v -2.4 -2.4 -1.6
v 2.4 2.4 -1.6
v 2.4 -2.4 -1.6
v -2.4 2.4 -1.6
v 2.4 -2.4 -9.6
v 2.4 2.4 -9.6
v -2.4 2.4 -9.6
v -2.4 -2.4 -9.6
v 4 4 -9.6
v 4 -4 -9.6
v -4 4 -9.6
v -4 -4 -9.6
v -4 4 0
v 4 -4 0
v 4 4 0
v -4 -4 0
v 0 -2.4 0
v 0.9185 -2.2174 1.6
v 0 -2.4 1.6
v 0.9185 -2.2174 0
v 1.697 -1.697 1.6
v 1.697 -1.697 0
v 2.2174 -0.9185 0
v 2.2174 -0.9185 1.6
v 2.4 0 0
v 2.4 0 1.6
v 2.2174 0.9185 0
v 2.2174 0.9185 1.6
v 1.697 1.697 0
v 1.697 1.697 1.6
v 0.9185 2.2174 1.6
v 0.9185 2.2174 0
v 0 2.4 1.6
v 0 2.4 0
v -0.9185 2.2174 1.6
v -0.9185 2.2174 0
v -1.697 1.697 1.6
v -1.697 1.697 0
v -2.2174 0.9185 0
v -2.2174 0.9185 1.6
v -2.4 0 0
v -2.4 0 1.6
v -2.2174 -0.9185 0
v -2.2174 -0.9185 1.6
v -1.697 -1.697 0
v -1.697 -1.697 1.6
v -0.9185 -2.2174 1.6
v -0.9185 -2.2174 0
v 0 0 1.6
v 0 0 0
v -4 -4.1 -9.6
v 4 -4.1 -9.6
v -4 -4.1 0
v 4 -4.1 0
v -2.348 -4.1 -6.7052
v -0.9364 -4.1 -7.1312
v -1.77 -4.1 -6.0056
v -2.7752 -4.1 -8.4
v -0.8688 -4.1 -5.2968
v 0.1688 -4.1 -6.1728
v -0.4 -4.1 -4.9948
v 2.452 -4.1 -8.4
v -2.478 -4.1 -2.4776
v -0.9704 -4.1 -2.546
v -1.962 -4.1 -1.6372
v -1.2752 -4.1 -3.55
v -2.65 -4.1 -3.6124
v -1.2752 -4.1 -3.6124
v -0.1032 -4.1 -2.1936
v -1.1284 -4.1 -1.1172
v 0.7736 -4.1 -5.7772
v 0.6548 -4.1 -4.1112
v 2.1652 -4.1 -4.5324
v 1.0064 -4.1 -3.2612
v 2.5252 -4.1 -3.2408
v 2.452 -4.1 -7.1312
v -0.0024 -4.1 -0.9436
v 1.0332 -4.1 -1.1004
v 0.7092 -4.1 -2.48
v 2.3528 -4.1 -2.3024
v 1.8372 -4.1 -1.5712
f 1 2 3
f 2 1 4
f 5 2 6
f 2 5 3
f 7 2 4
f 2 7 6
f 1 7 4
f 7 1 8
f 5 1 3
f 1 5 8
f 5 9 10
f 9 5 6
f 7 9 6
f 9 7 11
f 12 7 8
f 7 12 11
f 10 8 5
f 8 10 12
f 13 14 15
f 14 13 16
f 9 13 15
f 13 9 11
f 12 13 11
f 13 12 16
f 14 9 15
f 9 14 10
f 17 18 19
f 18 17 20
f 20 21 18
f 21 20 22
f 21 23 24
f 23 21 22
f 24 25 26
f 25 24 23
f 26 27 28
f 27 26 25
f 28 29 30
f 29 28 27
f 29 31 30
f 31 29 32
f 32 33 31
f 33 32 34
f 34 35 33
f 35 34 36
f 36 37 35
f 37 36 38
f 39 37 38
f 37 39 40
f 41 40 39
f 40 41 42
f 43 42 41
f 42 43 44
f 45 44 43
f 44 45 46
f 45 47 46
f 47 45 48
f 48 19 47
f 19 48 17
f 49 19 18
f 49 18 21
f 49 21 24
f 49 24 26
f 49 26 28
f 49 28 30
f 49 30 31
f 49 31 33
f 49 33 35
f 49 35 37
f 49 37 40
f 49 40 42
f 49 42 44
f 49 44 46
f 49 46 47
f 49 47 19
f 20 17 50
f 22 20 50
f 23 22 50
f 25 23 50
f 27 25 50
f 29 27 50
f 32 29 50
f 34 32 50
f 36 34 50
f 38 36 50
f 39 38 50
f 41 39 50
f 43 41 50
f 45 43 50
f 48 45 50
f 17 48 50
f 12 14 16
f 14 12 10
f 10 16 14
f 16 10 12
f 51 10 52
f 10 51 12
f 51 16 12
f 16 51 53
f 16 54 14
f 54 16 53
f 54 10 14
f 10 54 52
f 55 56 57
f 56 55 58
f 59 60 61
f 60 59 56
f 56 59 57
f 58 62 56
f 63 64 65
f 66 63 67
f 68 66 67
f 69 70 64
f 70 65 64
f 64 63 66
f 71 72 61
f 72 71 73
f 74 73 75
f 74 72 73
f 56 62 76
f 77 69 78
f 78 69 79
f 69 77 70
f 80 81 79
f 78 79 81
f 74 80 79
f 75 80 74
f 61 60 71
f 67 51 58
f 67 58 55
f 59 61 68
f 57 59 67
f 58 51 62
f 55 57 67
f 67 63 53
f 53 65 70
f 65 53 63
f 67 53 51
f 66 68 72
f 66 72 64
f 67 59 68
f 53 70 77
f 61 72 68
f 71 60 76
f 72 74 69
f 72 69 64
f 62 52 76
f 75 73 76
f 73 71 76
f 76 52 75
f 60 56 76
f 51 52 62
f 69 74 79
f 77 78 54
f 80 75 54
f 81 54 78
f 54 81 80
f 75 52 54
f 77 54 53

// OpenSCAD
// file: ../p/4-4edge.scad
use <../lib.scad>
function ldraw_lib__4_4edge() = [
// 0 Circle 1.0
// 0 Name: 4-4edge.dat
// 0 Author: James Jessiman
// 0 !LDRAW_ORG Primitive UPDATE 2017-01
// 0 !LICENSE Licensed under CC BY 2.0 and CC BY 4.0 : see CAreadme.txt
// 
// 0 BFC CERTIFY CCW
  [0,"BFC","CERTIFY"],
  [0,"BFC","CCW"],
// 
// 0 !HISTORY 1998-12-15 [PTadmin] Official Update 1998-10
// 0 !HISTORY 2005-12-28 [PTadmin] Official Update 2005-01
// 0 !HISTORY 2007-06-24 [PTadmin] Header formatted for Contributor Agreement
// 0 !HISTORY 2008-07-01 [PTadmin] Official Update 2008-01
// 0 !HISTORY 2017-01-15 [Steffen] BFCed
// 0 !HISTORY 2017-12-30 [PTadmin] Official Update 2017-01
// 
// 
// 2 24 1 0 0 0.9239 0 0.3827
  [2,24,1,0,0,0.9239,0,0.3827],
// 2 24 0.9239 0 0.3827 0.7071 0 0.7071
  [2,24,0.9239,0,0.3827,0.7071,0,0.7071],
// 2 24 0.7071 0 0.7071 0.3827 0 0.9239
  [2,24,0.7071,0,0.7071,0.3827,0,0.9239],
// 2 24 0.3827 0 0.9239 0 0 1
  [2,24,0.3827,0,0.9239,0,0,1],
// 2 24 0 0 1 -0.3827 0 0.9239
  [2,24,0,0,1,-0.3827,0,0.9239],
// 2 24 -0.3827 0 0.9239 -0.7071 0 0.7071
  [2,24,-0.3827,0,0.9239,-0.7071,0,0.7071],
// 2 24 -0.7071 0 0.7071 -0.9239 0 0.3827
  [2,24,-0.7071,0,0.7071,-0.9239,0,0.3827],
// 2 24 -0.9239 0 0.3827 -1 0 -0
  [2,24,-0.9239,0,0.3827,-1,0,-0],
// 2 24 -1 0 -0 -0.9239 0 -0.3827
  [2,24,-1,0,-0,-0.9239,0,-0.3827],
// 2 24 -0.9239 0 -0.3827 -0.7071 0 -0.7071
  [2,24,-0.9239,0,-0.3827,-0.7071,0,-0.7071],
// 2 24 -0.7071 0 -0.7071 -0.3827 0 -0.9239
  [2,24,-0.7071,0,-0.7071,-0.3827,0,-0.9239],
// 2 24 -0.3827 0 -0.9239 0 0 -1
  [2,24,-0.3827,0,-0.9239,0,0,-1],
// 2 24 0 0 -1 0.3827 0 -0.9239
  [2,24,0,0,-1,0.3827,0,-0.9239],
// 2 24 0.3827 0 -0.9239 0.7071 0 -0.7071
  [2,24,0.3827,0,-0.9239,0.7071,0,-0.7071],
// 2 24 0.7071 0 -0.7071 0.9239 0 -0.3827
  [2,24,0.7071,0,-0.7071,0.9239,0,-0.3827],
// 2 24 0.9239 0 -0.3827 1 0 0
  [2,24,0.9239,0,-0.3827,1,0,0],
];
module ldraw_lib__4_4edge(step=0, col=false, unit=2/5, alt=false, line=0.2, solid=!$preview)
    makepoly(ldraw_lib__4_4edge(), step=step, col=col, unit=unit, alt=alt, line=line, solid=solid);
ldraw_lib__4_4edge(line=0.2);
// file: ../p/4-4disc.scad
use <../lib.scad>
function ldraw_lib__4_4disc() = [
// 0 Disc 1.0
// 0 Name: 4-4disc.dat
// 0 Author: James Jessiman
// 0 !LDRAW_ORG Primitive UPDATE 2002-02
// 0 !LICENSE Licensed under CC BY 2.0 and CC BY 4.0 : see CAreadme.txt
// 
// 0 BFC CERTIFY CCW
  [0,"BFC","CERTIFY"],
  [0,"BFC","CCW"],
// 
// 0 !HISTORY 1998-12-15 [PTadmin] Official Update 1998-10
// 0 !HISTORY 2002-03-23 [sbliss] Added BFC statement
// 0 !HISTORY 2002-04-25 [PTadmin] Official Update 2002-02
// 0 !HISTORY 2007-06-24 [PTadmin] Header formatted for Contributor Agreement
// 0 !HISTORY 2008-07-01 [PTadmin] Official Update 2008-01
// 
// 
// 3 16 0 0 0 1 0 0 0.9239 0 0.3827
  [3,16,0,0,0,1,0,0,0.9239,0,0.3827],
// 3 16 0 0 0 0.9239 0 0.3827 0.7071 0 0.7071
  [3,16,0,0,0,0.9239,0,0.3827,0.7071,0,0.7071],
// 3 16 0 0 0 0.7071 0 0.7071 0.3827 0 0.9239
  [3,16,0,0,0,0.7071,0,0.7071,0.3827,0,0.9239],
// 3 16 0 0 0 0.3827 0 0.9239 0 0 1
  [3,16,0,0,0,0.3827,0,0.9239,0,0,1],
// 3 16 0 0 0 0 0 1 -0.3827 0 0.9239
  [3,16,0,0,0,0,0,1,-0.3827,0,0.9239],
// 3 16 0 0 0 -0.3827 0 0.9239 -0.7071 0 0.7071
  [3,16,0,0,0,-0.3827,0,0.9239,-0.7071,0,0.7071],
// 3 16 0 0 0 -0.7071 0 0.7071 -0.9239 0 0.3827
  [3,16,0,0,0,-0.7071,0,0.7071,-0.9239,0,0.3827],
// 3 16 0 0 0 -0.9239 0 0.3827 -1 0 -0
  [3,16,0,0,0,-0.9239,0,0.3827,-1,0,-0],
// 3 16 0 0 0 -1 0 -0 -0.9239 0 -0.3827
  [3,16,0,0,0,-1,0,-0,-0.9239,0,-0.3827],
// 3 16 0 0 0 -0.9239 0 -0.3827 -0.7071 0 -0.7071
  [3,16,0,0,0,-0.9239,0,-0.3827,-0.7071,0,-0.7071],
// 3 16 0 0 0 -0.7071 0 -0.7071 -0.3827 0 -0.9239
  [3,16,0,0,0,-0.7071,0,-0.7071,-0.3827,0,-0.9239],
// 3 16 0 0 0 -0.3827 0 -0.9239 0 0 -1
  [3,16,0,0,0,-0.3827,0,-0.9239,0,0,-1],
// 3 16 0 0 0 0 0 -1 0.3827 0 -0.9239
  [3,16,0,0,0,0,0,-1,0.3827,0,-0.9239],
// 3 16 0 0 0 0.3827 0 -0.9239 0.7071 0 -0.7071
  [3,16,0,0,0,0.3827,0,-0.9239,0.7071,0,-0.7071],
// 3 16 0 0 0 0.7071 0 -0.7071 0.9239 0 -0.3827
  [3,16,0,0,0,0.7071,0,-0.7071,0.9239,0,-0.3827],
// 3 16 0 0 0 0.9239 0 -0.3827 1 0 0
  [3,16,0,0,0,0.9239,0,-0.3827,1,0,0],
// 0
];
module ldraw_lib__4_4disc(step=0, col=false, unit=2/5, alt=false, line=0.2, solid=!$preview)
    makepoly(ldraw_lib__4_4disc(), step=step, col=col, unit=unit, alt=alt, line=line, solid=solid);
ldraw_lib__4_4disc(line=0.2);
// file: ../p/4-4cyli.scad
use <../lib.scad>
$fa=1; $fs=0.2;
function ldraw_lib__4_4cyli(realsolid=false) = [
// 0 Cylinder 1.0
// 0 Name: 4-4cyli.dat
// 0 Author: James Jessiman
// 0 !LDRAW_ORG Primitive UPDATE 2005-01
// 0 !LICENSE Licensed under CC BY 2.0 and CC BY 4.0 : see CAreadme.txt
// 
// 0 BFC CERTIFY CCW
  [0,"BFC","CERTIFY"],
  [0,"BFC","CCW"],
// 
// 0 !HISTORY 1998-12-15 [PTadmin] Official Update 1998-10
// 0 !HISTORY 2002-03-23 [sbliss] Added BFC statement; merged headers from files in distributions LDraw 0.27 and Complete.
// 0 !HISTORY 2002-04-25 [PTadmin] Official Update 2002-02
// 0 !HISTORY 2004-12-14 [guyvivan] BFC CCW
// 0 !HISTORY 2005-12-28 [PTadmin] Official Update 2005-01
// 0 !HISTORY 2007-06-24 [PTadmin] Header formatted for Contributor Agreement
// 0 !HISTORY 2008-07-01 [PTadmin] Official Update 2008-01
// 
// 
// 4 16 1 1 0 0.9239 1 0.3827 0.9239 0 0.3827 1 0 0
  [4,16,1,1,0,0.9239,1,0.3827,0.9239,0,0.3827,1,0,0],
// 5 24 1 0 0 1 1 0 0.9239 0 0.3827 0.9239 0 -0.3827
  [5,24,1,0,0,1,1,0,0.9239,0,0.3827,0.9239,0,-0.3827],
// 4 16 0.9239 1 0.3827 0.7071 1 0.7071 0.7071 0 0.7071 0.9239 0 0.3827
  [4,16,0.9239,1,0.3827,0.7071,1,0.7071,0.7071,0,0.7071,0.9239,0,0.3827],
// 5 24 0.9239 0 0.3827 0.9239 1 0.3827 0.7071 0 0.7071 1 0 0
  [5,24,0.9239,0,0.3827,0.9239,1,0.3827,0.7071,0,0.7071,1,0,0],
// 4 16 0.7071 1 0.7071 0.3827 1 0.9239 0.3827 0 0.9239 0.7071 0 0.7071
  [4,16,0.7071,1,0.7071,0.3827,1,0.9239,0.3827,0,0.9239,0.7071,0,0.7071],
// 5 24 0.7071 0 0.7071 0.7071 1 0.7071 0.3827 0 0.9239 0.9239 0 0.3827
  [5,24,0.7071,0,0.7071,0.7071,1,0.7071,0.3827,0,0.9239,0.9239,0,0.3827],
// 4 16 0.3827 1 0.9239 0 1 1 0 0 1 0.3827 0 0.9239
  [4,16,0.3827,1,0.9239,0,1,1,0,0,1,0.3827,0,0.9239],
// 5 24 0.3827 0 0.9239 0.3827 1 0.9239 0 0 1 0.7071 0 0.7071
  [5,24,0.3827,0,0.9239,0.3827,1,0.9239,0,0,1,0.7071,0,0.7071],
// 4 16 0 1 1 -0.3827 1 0.9239 -0.3827 0 0.9239 0 0 1
  [4,16,0,1,1,-0.3827,1,0.9239,-0.3827,0,0.9239,0,0,1],
// 5 24 0 0 1 0 1 1 -0.3827 0 0.9239 0.3827 0 0.9239
  [5,24,0,0,1,0,1,1,-0.3827,0,0.9239,0.3827,0,0.9239],
// 4 16 -0.3827 1 0.9239 -0.7071 1 0.7071 -0.7071 0 0.7071 -0.3827 0 0.9239
  [4,16,-0.3827,1,0.9239,-0.7071,1,0.7071,-0.7071,0,0.7071,-0.3827,0,0.9239],
// 5 24 -0.3827 0 0.9239 -0.3827 1 0.9239 -0.7071 0 0.7071 0 0 1
  [5,24,-0.3827,0,0.9239,-0.3827,1,0.9239,-0.7071,0,0.7071,0,0,1],
// 4 16 -0.7071 1 0.7071 -0.9239 1 0.3827 -0.9239 0 0.3827 -0.7071 0 0.7071
  [4,16,-0.7071,1,0.7071,-0.9239,1,0.3827,-0.9239,0,0.3827,-0.7071,0,0.7071],
// 5 24 -0.7071 0 0.7071 -0.7071 1 0.7071 -0.9239 0 0.3827 -0.3827 0 0.9239
  [5,24,-0.7071,0,0.7071,-0.7071,1,0.7071,-0.9239,0,0.3827,-0.3827,0,0.9239],
// 4 16 -0.9239 1 0.3827 -1 1 0 -1 0 0 -0.9239 0 0.3827
  [4,16,-0.9239,1,0.3827,-1,1,0,-1,0,0,-0.9239,0,0.3827],
// 5 24 -0.9239 0 0.3827 -0.9239 1 0.3827 -1 0 0 -0.7071 0 0.7071
  [5,24,-0.9239,0,0.3827,-0.9239,1,0.3827,-1,0,0,-0.7071,0,0.7071],
// 4 16 -1 1 0 -0.9239 1 -0.3827 -0.9239 0 -0.3827 -1 0 0
  [4,16,-1,1,0,-0.9239,1,-0.3827,-0.9239,0,-0.3827,-1,0,0],
// 5 24 -1 0 0 -1 1 0 -0.9239 0 -0.3827 -0.9239 0 0.3827
  [5,24,-1,0,0,-1,1,0,-0.9239,0,-0.3827,-0.9239,0,0.3827],
// 4 16 -0.9239 1 -0.3827 -0.7071 1 -0.7071 -0.7071 0 -0.7071 -0.9239 0 -0.3827
  [4,16,-0.9239,1,-0.3827,-0.7071,1,-0.7071,-0.7071,0,-0.7071,-0.9239,0,-0.3827],
// 5 24 -0.9239 0 -0.3827 -0.9239 1 -0.3827 -0.7071 0 -0.7071 -1 0 0
  [5,24,-0.9239,0,-0.3827,-0.9239,1,-0.3827,-0.7071,0,-0.7071,-1,0,0],
// 4 16 -0.7071 1 -0.7071 -0.3827 1 -0.9239 -0.3827 0 -0.9239 -0.7071 0 -0.7071
  [4,16,-0.7071,1,-0.7071,-0.3827,1,-0.9239,-0.3827,0,-0.9239,-0.7071,0,-0.7071],
// 5 24 -0.7071 0 -0.7071 -0.7071 1 -0.7071 -0.3827 0 -0.9239 -0.9239 0 -0.3827
  [5,24,-0.7071,0,-0.7071,-0.7071,1,-0.7071,-0.3827,0,-0.9239,-0.9239,0,-0.3827],
// 4 16 -0.3827 1 -0.9239 0 1 -1 0 0 -1 -0.3827 0 -0.9239
  [4,16,-0.3827,1,-0.9239,0,1,-1,0,0,-1,-0.3827,0,-0.9239],
// 5 24 -0.3827 0 -0.9239 -0.3827 1 -0.9239 0 0 -1 -0.7071 0 -0.7071
  [5,24,-0.3827,0,-0.9239,-0.3827,1,-0.9239,0,0,-1,-0.7071,0,-0.7071],
// 4 16 0 1 -1 0.3827 1 -0.9239 0.3827 0 -0.9239 0 0 -1
  [4,16,0,1,-1,0.3827,1,-0.9239,0.3827,0,-0.9239,0,0,-1],
// 5 24 0 0 -1 0 1 -1 0.3827 0 -0.9239 -0.3827 0 -0.9239
  [5,24,0,0,-1,0,1,-1,0.3827,0,-0.9239,-0.3827,0,-0.9239],
// 4 16 0.3827 1 -0.9239 0.7071 1 -0.7071 0.7071 0 -0.7071 0.3827 0 -0.9239
  [4,16,0.3827,1,-0.9239,0.7071,1,-0.7071,0.7071,0,-0.7071,0.3827,0,-0.9239],
// 5 24 0.3827 0 -0.9239 0.3827 1 -0.9239 0.7071 0 -0.7071 0 0 -1
  [5,24,0.3827,0,-0.9239,0.3827,1,-0.9239,0.7071,0,-0.7071,0,0,-1],
// 4 16 0.7071 1 -0.7071 0.9239 1 -0.3827 0.9239 0 -0.3827 0.7071 0 -0.7071
  [4,16,0.7071,1,-0.7071,0.9239,1,-0.3827,0.9239,0,-0.3827,0.7071,0,-0.7071],
// 5 24 0.7071 0 -0.7071 0.7071 1 -0.7071 0.9239 0 -0.3827 0.3827 0 -0.9239
  [5,24,0.7071,0,-0.7071,0.7071,1,-0.7071,0.9239,0,-0.3827,0.3827,0,-0.9239],
// 4 16 0.9239 1 -0.3827 1 1 0 1 0 0 0.9239 0 -0.3827
  [4,16,0.9239,1,-0.3827,1,1,0,1,0,0,0.9239,0,-0.3827],
// 5 24 0.9239 0 -0.3827 0.9239 1 -0.3827 1 0 0 0.7071 0 -0.7071
  [5,24,0.9239,0,-0.3827,0.9239,1,-0.3827,1,0,0,0.7071,0,-0.7071],
// 0
];
module ldraw_lib__4_4cyli(step=0, col=false, unit=2/5, alt=false, line=0.2, solid=!$preview)
    makepoly(ldraw_lib__4_4cyli(solid), step=step, col=col, unit=unit, alt=alt, line=line, solid=solid);
ldraw_lib__4_4cyli(line=0.2);
// file: ../p/stud.scad
use <../lib.scad>
use <4-4cyli.scad>
use <4-4disc.scad>
use <4-4edge.scad>
function ldraw_lib__stud() = [
// 0 Stud
// 0 Name: stud.dat
// 0 Author: James Jessiman
// 0 !LDRAW_ORG Primitive UPDATE 2012-01
// 0 !LICENSE Licensed under CC BY 4.0 : see CAreadme.txt
// 
// 0 BFC CERTIFY CCW
  [0,"BFC","CERTIFY"],
  [0,"BFC","CCW"],
// 
// 0 !HISTORY 2002-04-04 [sbliss] Modified for BFC compliance
// 0 !HISTORY 2002-04-25 [PTadmin] Official Update 2002-02
// 0 !HISTORY 2007-06-24 [PTadmin] Header formatted for Contributor Agreement
// 0 !HISTORY 2008-07-01 [PTadmin] Official Update 2008-01
// 0 !HISTORY 2012-02-16 [Philo] Changed to CCW
// 0 !HISTORY 2012-03-30 [PTadmin] Official Update 2012-01
// 
// 
// 1 16 0 0 0 6 0 0 0 1 0 0 0 6 4-4edge.dat
  [1,16,0,0,0,6,0,0,0,1,0,0,0,6, ldraw_lib__4_4edge()],
// 1 16 0 -4 0 6 0 0 0 1 0 0 0 6 4-4edge.dat
  [1,16,0,-4,0,6,0,0,0,1,0,0,0,6, ldraw_lib__4_4edge()],
// 1 16 0 0 0 6 0 0 0 -4 0 0 0 6 4-4cyli.dat
  [1,16,0,0,0,6,0,0,0,-4,0,0,0,6, ldraw_lib__4_4cyli()],
// 1 16 0 -4 0 6 0 0 0 1 0 0 0 6 4-4disc.dat
  [1,16,0,-4,0,6,0,0,0,1,0,0,0,6, ldraw_lib__4_4disc()],
  [-1,16,0,0,0,6,0,0,0,-1,0,0,0,6, ldraw_lib__4_4disc()],
];
module ldraw_lib__stud(step=0, col=false, unit=2/5, alt=false, line=0.2, solid=!$preview)
    makepoly(ldraw_lib__stud(), step=step, col=col, unit=unit, alt=alt, line=line, solid=solid);
ldraw_lib__stud(line=0.2);
// file: ../p/box5.scad
use <../lib.scad>
function ldraw_lib__box5() = [
// 0 Box with 5 Faces and All Edges
// 0 Name: box5.dat
// 0 Author: James Jessiman
// 0 !LDRAW_ORG Primitive UPDATE 2012-01
// 0 !LICENSE Licensed under CC BY 2.0 and CC BY 4.0 : see CAreadme.txt
// 
// 0 BFC CERTIFY CCW
  [0,"BFC","CERTIFY"],
  [0,"BFC","CCW"],
// 
// 0 !HISTORY 2002-04-03 [sbliss] Modified for BFC compliance
// 0 !HISTORY 2002-04-25 [PTadmin] Official Update 2002-02
// 0 !HISTORY 2007-06-24 [PTadmin] Header formatted for Contributor Agreement
// 0 !HISTORY 2008-07-01 [PTadmin] Official Update 2008-01
// 0 !HISTORY 2012-02-16 [Philo] Changed to CCW
// 0 !HISTORY 2012-03-30 [PTadmin] Official Update 2012-01
// 
// 
// 2 24 1 1 1 -1 1 1
  [2,24,1,1,1,-1,1,1],
// 2 24 -1 1 1 -1 1 -1
  [2,24,-1,1,1,-1,1,-1],
// 2 24 -1 1 -1 1 1 -1
  [2,24,-1,1,-1,1,1,-1],
// 2 24 1 1 -1 1 1 1
  [2,24,1,1,-1,1,1,1],
// 2 24 1 0 1 -1 0 1
  [2,24,1,0,1,-1,0,1],
// 2 24 -1 0 1 -1 0 -1
  [2,24,-1,0,1,-1,0,-1],
// 2 24 -1 0 -1 1 0 -1
  [2,24,-1,0,-1,1,0,-1],
// 2 24 1 0 -1 1 0 1
  [2,24,1,0,-1,1,0,1],
// 2 24 1 0 1 1 1 1
  [2,24,1,0,1,1,1,1],
// 2 24 -1 0 1 -1 1 1
  [2,24,-1,0,1,-1,1,1],
// 2 24 1 0 -1 1 1 -1
  [2,24,1,0,-1,1,1,-1],
// 2 24 -1 0 -1 -1 1 -1
  [2,24,-1,0,-1,-1,1,-1],
// 4 16 -1 1 1 1 1 1 1 1 -1 -1 1 -1
  [4,16,-1,1,1,1,1,1,1,1,-1,-1,1,-1],
// 4 16 -1 1 1 -1 0 1 1 0 1 1 1 1
  [4,16,-1,1,1,-1,0,1,1,0,1,1,1,1],
// 4 16 -1 1 -1 -1 0 -1 -1 0 1 -1 1 1
  [4,16,-1,1,-1,-1,0,-1,-1,0,1,-1,1,1],
// 4 16 1 1 -1 1 0 -1 -1 0 -1 -1 1 -1
  [4,16,1,1,-1,1,0,-1,-1,0,-1,-1,1,-1],
// 4 16 1 1 1 1 0 1 1 0 -1 1 1 -1
  [4,16,1,1,1,1,0,1,1,0,-1,1,1,-1],
];
makepoly(ldraw_lib__box5(), line=0.2);
// file: ../p/box4t.scad
use <../lib.scad>
function ldraw_lib__box4t() = [
// 0 Box with 4 Adjacent Faces and All Edges
// 0 Name: box4t.dat
// 0 Author: Tore Eriksson [Tore_Eriksson]
// 0 !LDRAW_ORG Primitive UPDATE 2003-02
// 0 !LICENSE Licensed under CC BY 2.0 and CC BY 4.0 : see CAreadme.txt
// 
// 0 BFC CERTIFY CCW
  [0,"BFC","CERTIFY"],
  [0,"BFC","CCW"],
// 
// 0 !HISTORY 1997-09-29 [PTadmin] Official Update 1997-15
// 0 !HISTORY 2002-08-31 [izanette] Modified with WINDZ for BFC compliance
// 0 !HISTORY 2003-08-01 [PTadmin] Official Update 2003-02
// 0 !HISTORY 2007-06-24 [PTadmin] Header formatted for Contributor Agreement
// 0 !HISTORY 2008-07-01 [PTadmin] Official Update 2008-01
// 
// 
// 2 24 1 1 1 -1 1 1
  [2,24,1,1,1,-1,1,1],
// 2 24 -1 1 1 -1 1 -1
  [2,24,-1,1,1,-1,1,-1],
// 2 24 -1 1 -1 1 1 -1
  [2,24,-1,1,-1,1,1,-1],
// 2 24 1 1 -1 1 1 1
  [2,24,1,1,-1,1,1,1],
// 2 24 1 0 1 -1 0 1
  [2,24,1,0,1,-1,0,1],
// 2 24 -1 0 1 -1 0 -1
  [2,24,-1,0,1,-1,0,-1],
// 2 24 -1 0 -1 1 0 -1
  [2,24,-1,0,-1,1,0,-1],
// 2 24 1 0 -1 1 0 1
  [2,24,1,0,-1,1,0,1],
// 2 24 1 0 1 1 1 1
  [2,24,1,0,1,1,1,1],
// 2 24 -1 0 1 -1 1 1
  [2,24,-1,0,1,-1,1,1],
// 2 24 1 0 -1 1 1 -1
  [2,24,1,0,-1,1,1,-1],
// 2 24 -1 0 -1 -1 1 -1
  [2,24,-1,0,-1,-1,1,-1],
// 4 16 1 1 1 1 1 -1 -1 1 -1 -1 1 1
  [4,16,1,1,1,1,1,-1,-1,1,-1,-1,1,1],
// 4 16 1 1 1 -1 1 1 -1 0 1 1 0 1
  [4,16,1,1,1,-1,1,1,-1,0,1,1,0,1],
// 4 16 -1 1 1 -1 1 -1 -1 0 -1 -1 0 1
  [4,16,-1,1,1,-1,1,-1,-1,0,-1,-1,0,1],
// 0 4 16 -1 1 -1 -1 0 -1 1 0 -1 1 1 -1
// 4 16 1 1 -1 1 1 1 1 0 1 1 0 -1
  [4,16,1,1,-1,1,1,1,1,0,1,1,0,-1],
// 0
];
makepoly(ldraw_lib__box4t(), line=0.2);
// file: s/3005s01.scad
use <../../lib.scad>
use <../../p/box4t.scad>
use <../../p/box5.scad>
use <../../p/stud.scad>
function ldraw_lib__s__3005s01() = [
// 0 ~Brick  1 x  1 without Front Face
// 0 Name: s\3005s01.dat
// 0 Author: John Riley [jriley]
// 0 !LDRAW_ORG Subpart UPDATE 2004-01
// 0 !LICENSE Licensed under CC BY 2.0 and CC BY 4.0 : see CAreadme.txt
// 
// 0 BFC CERTIFY CCW
  [0,"BFC","CERTIFY"],
  [0,"BFC","CCW"],
// 
// 0 !HISTORY 2003-09-07 [jriley] BFCed & Subfiled
// 0 !HISTORY 2004-03-02 [PTadmin] Official Update 2004-01
// 0 !HISTORY 2007-08-29 [PTadmin] Header formatted for Contributor Agreement
// 0 !HISTORY 2008-07-01 [PTadmin] Official Update 2008-01
// 
// 
// 0 BFC INVERTNEXT
  [0,"BFC","INVERTNEXT"],
// 1 16 0 24 0 0 0 6 0 -20 0 -6 0 0 box5.dat
  [1,16,0,24,0,0,0,6,0,-20,0,-6,0,0, ldraw_lib__box5()],
// 4 16 10 24 -10 6 24 -6 6 24 6 10 24 10
  [4,16,10,24,-10,6,24,-6,6,24,6,10,24,10],
// 4 16 10 24 10 6 24 6 -6 24 6 -10 24 10
  [4,16,10,24,10,6,24,6,-6,24,6,-10,24,10],
// 4 16 -10 24 10 -6 24 6 -6 24 -6 -10 24 -10
  [4,16,-10,24,10,-6,24,6,-6,24,-6,-10,24,-10],
// 4 16 -10 24 -10 -6 24 -6 6 24 -6 10 24 -10
  [4,16,-10,24,-10,-6,24,-6,6,24,-6,10,24,-10],
// 1 16 0 24 0 10 0 0 0 -24 0 0 0 10 box4t.dat
  [1,16,0,24,0,10,0,0,0,-24,0,0,0,10, ldraw_lib__box4t()],
// 1 16 0 0 0 0 0 1 0 1 0 -1 0 0 stud.dat
  [1,16,0,0,0,0,0,1,0,1,0,-1,0,0, ldraw_lib__stud()],
// 0
];
module ldraw_lib__s__3005s01(step=0, col=false, unit=2/5, alt=false, line=0.2, solid=!$preview)
    makepoly(ldraw_lib__s__3005s01(), step=step, col=col, unit=unit, alt=alt, line=line, solid=solid);
ldraw_lib__s__3005s01(line=0.2);
// file: ../p/box5-12.scad
use <../lib.scad>
function ldraw_lib__box5_12() = [
// 0 Box with 5 Faces without Any Edges
// 0 Name: box5-12.dat
// 0 Author: Chris Dee [cwdee]
// 0 !LDRAW_ORG Primitive UPDATE 2009-02
// 0 !LICENSE Licensed under CC BY 2.0 and CC BY 4.0 : see CAreadme.txt
// 
// 0 BFC CERTIFY CCW
  [0,"BFC","CERTIFY"],
  [0,"BFC","CCW"],
// 
// 0 !HISTORY 2009-09-03 [PTadmin] Official Update 2009-02
// 
// 
// 4 16 1 1 1 1 1 -1 -1 1 -1 -1 1 1
  [4,16,1,1,1,1,1,-1,-1,1,-1,-1,1,1],
// 4 16 -1 0 1 1 0 1 1 1 1 -1 1 1
  [4,16,-1,0,1,1,0,1,1,1,1,-1,1,1],
// 4 16 -1 0 -1 -1 0 1 -1 1 1 -1 1 -1
  [4,16,-1,0,-1,-1,0,1,-1,1,1,-1,1,-1],
// 4 16 1 0 -1 -1 0 -1 -1 1 -1 1 1 -1
  [4,16,1,0,-1,-1,0,-1,-1,1,-1,1,1,-1],
// 4 16 1 0 1 1 0 -1 1 1 -1 1 1 1
  [4,16,1,0,1,1,0,-1,1,1,-1,1,1,1],
// 0
];
module ldraw_lib__box5_12(step=0, col=false, unit=2/5, alt=false, line=0.2, solid=!$preview)
    makepoly(ldraw_lib__box5_12(), step=step, col=col, unit=unit, alt=alt, line=line, solid=solid);
ldraw_lib__box5_12(line=0.2);
// file: 3005.scad
use <../lib.scad>
use <s/3005s01.scad>
function ldraw_lib__3005() = [
// 0 Brick  1 x  1
// 0 Name: 3005.dat
// 0 Author: James Jessiman
// 0 !LDRAW_ORG Part UPDATE 2022-05
// 0 !LICENSE Licensed under CC BY 2.0 and CC BY 4.0 : see CAreadme.txt
// 
// 0 BFC CERTIFY CCW
  [0,"BFC","CERTIFY"],
  [0,"BFC","CCW"],
// 
// 0 !HISTORY 2001-10-26 [PTadmin] Official Update 2001-01
// 0 !HISTORY 2002-05-07 {unknown} BFC Certification
// 0 !HISTORY 2002-06-11 [PTadmin] Official Update 2002-03
// 0 !HISTORY 2007-05-07 [PTadmin] Header formatted for Contributor Agreement
// 0 !HISTORY 2008-07-01 [PTadmin] Official Update 2008-01
// 0 !HISTORY 2022-08-04 [MagFors] Using subfile
// 0 !HISTORY 2022-09-15 [PTadmin] Official Update 2022-05
// 
// 
// 1 16 0 0 0 1 0 0 0 1 0 0 0 1 s\3005s01.dat
  [1,16,0,0,0,1,0,0,0,1,0,0,0,1, ldraw_lib__s__3005s01()],
// 4 16 -10 24 -10 10 24 -10 10 0 -10 -10 0 -10
  [4,16,-10,24,-10,10,24,-10,10,0,-10,-10,0,-10],
];
module ldraw_lib__3005(step=0, col=false, unit=2/5, alt=false, line=0.2, solid=!$preview)
    makepoly(ldraw_lib__3005(), step=step, col=col, unit=unit, alt=alt, line=line, solid=solid);
ldraw_lib__3005(line=0.2);
// file: 191888d.scad
use <../lib.scad>
use <../p/box5-12.scad>
$fa=1; $fs=0.2;
function ldraw_lib__191888d(realsolid=false) = [
// 0 Sticker  1.2 x  1 with White "2"
// 0 Name: 191888d.dat
// 0 Author: Steffen [Steffen]
// 0 !LDRAW_ORG Part UPDATE 2012-01
// 0 !LICENSE Licensed under CC BY 2.0 and CC BY 4.0 : see CAreadme.txt
// 
// 0 BFC CERTIFY CCW
  [0,"BFC","CERTIFY"],
  [0,"BFC","CCW"],
// 
// 0 !KEYWORDS set 7710
// 
// 0 !HISTORY 2012-03-30 [PTadmin] Official Update 2012-01
// 
// 
// 1 16 0 -0.25 0 10 0 0 0 0.25 0 0 0 -12 box5-12.dat
  [1,16,0,-0.25,0,10,0,0,0,0.25,0,0,0,-12, ldraw_lib__box5_12(realsolid)],
// 3 15 -5.87 -0.25 -4.763 -2.341 -0.25 -5.828 -4.425 -0.25 -3.014
  [3,15,-5.87,-0.25,-4.763,-2.341,-0.25,-5.828,-4.425,-0.25,-3.014],
// 3 15 -2.341 -0.25 -5.828 -5.87 -0.25 -4.763 -6.938 -0.25 -9
  [3,15,-2.341,-0.25,-5.828,-5.87,-0.25,-4.763,-6.938,-0.25,-9],
// 3 15 -2.172 -0.25 -1.242 0.422 -0.25 -3.432 -1 -0.25 -0.487
  [3,15,-2.172,-0.25,-1.242,0.422,-0.25,-3.432,-1,-0.25,-0.487],
// 3 15 0.422 -0.25 -3.432 -2.172 -0.25 -1.242 -2.341 -0.25 -5.828
  [3,15,0.422,-0.25,-3.432,-2.172,-0.25,-1.242,-2.341,-0.25,-5.828],
// 3 15 -2.341 -0.25 -5.828 -2.172 -0.25 -1.242 -4.425 -0.25 -3.014
  [3,15,-2.341,-0.25,-5.828,-2.172,-0.25,-1.242,-4.425,-0.25,-3.014],
// 3 15 -6.938 -0.25 -9 6.13 -0.25 -9 -2.341 -0.25 -5.828
  [3,15,-6.938,-0.25,-9,6.13,-0.25,-9,-2.341,-0.25,-5.828],
// 3 15 -6.195 -0.25 5.806 -2.426 -0.25 5.635 -4.905 -0.25 7.907
  [3,15,-6.195,-0.25,5.806,-2.426,-0.25,5.635,-4.905,-0.25,7.907],
// 3 15 -3.188 -0.25 3.125 -6.195 -0.25 5.806 -6.625 -0.25 2.969
  [3,15,-3.188,-0.25,3.125,-6.195,-0.25,5.806,-6.625,-0.25,2.969],
// 3 15 -3.188 -0.25 2.969 -3.188 -0.25 3.125 -6.625 -0.25 2.969
  [3,15,-3.188,-0.25,2.969,-3.188,-0.25,3.125,-6.625,-0.25,2.969],
// 3 15 -0.258 -0.25 6.516 -2.821 -0.25 9.207 -2.426 -0.25 5.635
  [3,15,-0.258,-0.25,6.516,-2.821,-0.25,9.207,-2.426,-0.25,5.635],
// 3 15 -2.821 -0.25 9.207 -4.905 -0.25 7.907 -2.426 -0.25 5.635
  [3,15,-2.821,-0.25,9.207,-4.905,-0.25,7.907,-2.426,-0.25,5.635],
// 3 15 -2.426 -0.25 5.635 -6.195 -0.25 5.806 -3.188 -0.25 3.125
  [3,15,-2.426,-0.25,5.635,-6.195,-0.25,5.806,-3.188,-0.25,3.125],
// 3 15 1.934 -0.25 -2.443 1.637 -0.25 1.722 -1 -0.25 -0.487
  [3,15,1.934,-0.25,-2.443,1.637,-0.25,1.722,-1,-0.25,-0.487],
// 3 15 1.637 -0.25 1.722 1.934 -0.25 -2.443 5.413 -0.25 0.669
  [3,15,1.637,-0.25,1.722,1.934,-0.25,-2.443,5.413,-0.25,0.669],
// 3 15 2.516 -0.25 3.847 5.413 -0.25 0.669 6.313 -0.25 3.898
  [3,15,2.516,-0.25,3.847,5.413,-0.25,0.669,6.313,-0.25,3.898],
// 3 15 2.516 -0.25 3.847 1.637 -0.25 1.722 5.413 -0.25 0.669
  [3,15,2.516,-0.25,3.847,1.637,-0.25,1.722,5.413,-0.25,0.669],
// 3 15 -2.341 -0.25 -5.828 6.13 -0.25 -9 6.13 -0.25 -5.828
  [3,15,-2.341,-0.25,-5.828,6.13,-0.25,-9,6.13,-0.25,-5.828],
// 3 15 -0.006 -0.25 9.641 -0.258 -0.25 6.516 2.583 -0.25 9.249
  [3,15,-0.006,-0.25,9.641,-0.258,-0.25,6.516,2.583,-0.25,9.249],
// 3 15 2.583 -0.25 9.249 -0.258 -0.25 6.516 1.773 -0.25 5.8
  [3,15,2.583,-0.25,9.249,-0.258,-0.25,6.516,1.773,-0.25,5.8],
// 3 15 -0.258 -0.25 6.516 -0.006 -0.25 9.641 -2.821 -0.25 9.207
  [3,15,-0.258,-0.25,6.516,-0.006,-0.25,9.641,-2.821,-0.25,9.207],
// 3 15 5.882 -0.25 6.244 4.593 -0.25 8.072 1.773 -0.25 5.8
  [3,15,5.882,-0.25,6.244,4.593,-0.25,8.072,1.773,-0.25,5.8],
// 3 15 2.583 -0.25 9.249 1.773 -0.25 5.8 4.593 -0.25 8.072
  [3,15,2.583,-0.25,9.249,1.773,-0.25,5.8,4.593,-0.25,8.072],
// 3 15 2.516 -0.25 3.847 5.882 -0.25 6.244 1.773 -0.25 5.8
  [3,15,2.516,-0.25,3.847,5.882,-0.25,6.244,1.773,-0.25,5.8],
// 3 15 6.313 -0.25 3.898 5.882 -0.25 6.244 2.516 -0.25 3.847
  [3,15,6.313,-0.25,3.898,5.882,-0.25,6.244,2.516,-0.25,3.847],
// 3 15 -1 -0.25 -0.487 0.422 -0.25 -3.432 1.934 -0.25 -2.443
  [3,15,-1,-0.25,-0.487,0.422,-0.25,-3.432,1.934,-0.25,-2.443],
// 3 16 -6.625 -0.25 2.969 -10 -0.25 -12 -6.938 -0.25 -9
  [3,16,-6.625,-0.25,2.969,-10,-0.25,-12,-6.938,-0.25,-9],
// 3 16 -6.625 -0.25 2.969 -6.938 -0.25 -9 -5.87 -0.25 -4.763
  [3,16,-6.625,-0.25,2.969,-6.938,-0.25,-9,-5.87,-0.25,-4.763],
// 3 16 -2.172 -0.25 -1.242 -1 -0.25 -0.487 -3.188 -0.25 2.969
  [3,16,-2.172,-0.25,-1.242,-1,-0.25,-0.487,-3.188,-0.25,2.969],
// 3 16 -4.425 -0.25 -3.014 -2.172 -0.25 -1.242 -6.625 -0.25 2.969
  [3,16,-4.425,-0.25,-3.014,-2.172,-0.25,-1.242,-6.625,-0.25,2.969],
// 3 16 -6.938 -0.25 -9 -10 -0.25 -12 6.13 -0.25 -9
  [3,16,-6.938,-0.25,-9,-10,-0.25,-12,6.13,-0.25,-9],
// 3 16 -5.87 -0.25 -4.763 -4.425 -0.25 -3.014 -6.625 -0.25 2.969
  [3,16,-5.87,-0.25,-4.763,-4.425,-0.25,-3.014,-6.625,-0.25,2.969],
// 3 16 -6.625 -0.25 2.969 -6.195 -0.25 5.806 -10 -0.25 12
  [3,16,-6.625,-0.25,2.969,-6.195,-0.25,5.806,-10,-0.25,12],
// 3 16 -10 -0.25 12 -4.905 -0.25 7.907 -2.821 -0.25 9.207
  [3,16,-10,-0.25,12,-4.905,-0.25,7.907,-2.821,-0.25,9.207],
// 3 16 -4.905 -0.25 7.907 -10 -0.25 12 -6.195 -0.25 5.806
  [3,16,-4.905,-0.25,7.907,-10,-0.25,12,-6.195,-0.25,5.806],
// 3 16 -6.625 -0.25 2.969 -10 -0.25 12 -10 -0.25 -12
  [3,16,-6.625,-0.25,2.969,-10,-0.25,12,-10,-0.25,-12],
// 3 16 -3.188 -0.25 3.125 -3.188 -0.25 2.969 1.637 -0.25 1.722
  [3,16,-3.188,-0.25,3.125,-3.188,-0.25,2.969,1.637,-0.25,1.722],
// 3 16 -3.188 -0.25 3.125 1.637 -0.25 1.722 -2.426 -0.25 5.635
  [3,16,-3.188,-0.25,3.125,1.637,-0.25,1.722,-2.426,-0.25,5.635],
// 3 16 -6.625 -0.25 2.969 -2.172 -0.25 -1.242 -3.188 -0.25 2.969
  [3,16,-6.625,-0.25,2.969,-2.172,-0.25,-1.242,-3.188,-0.25,2.969],
// 3 16 -10 -0.25 12 -2.821 -0.25 9.207 -0.006 -0.25 9.641
  [3,16,-10,-0.25,12,-2.821,-0.25,9.207,-0.006,-0.25,9.641],
// 3 16 -1 -0.25 -0.487 1.637 -0.25 1.722 -3.188 -0.25 2.969
  [3,16,-1,-0.25,-0.487,1.637,-0.25,1.722,-3.188,-0.25,2.969],
// 3 16 1.934 -0.25 -2.443 0.422 -0.25 -3.432 6.13 -0.25 -5.828
  [3,16,1.934,-0.25,-2.443,0.422,-0.25,-3.432,6.13,-0.25,-5.828],
// 3 16 1.637 -0.25 1.722 2.516 -0.25 3.847 -0.258 -0.25 6.516
  [3,16,1.637,-0.25,1.722,2.516,-0.25,3.847,-0.258,-0.25,6.516],
// 3 16 1.637 -0.25 1.722 -0.258 -0.25 6.516 -2.426 -0.25 5.635
  [3,16,1.637,-0.25,1.722,-0.258,-0.25,6.516,-2.426,-0.25,5.635],
// 3 16 6.13 -0.25 -9 10 -0.25 -12 6.13 -0.25 -5.828
  [3,16,6.13,-0.25,-9,10,-0.25,-12,6.13,-0.25,-5.828],
// 3 16 6.313 -0.25 3.898 5.413 -0.25 0.669 6.13 -0.25 -5.828
  [3,16,6.313,-0.25,3.898,5.413,-0.25,0.669,6.13,-0.25,-5.828],
// 3 16 5.413 -0.25 0.669 1.934 -0.25 -2.443 6.13 -0.25 -5.828
  [3,16,5.413,-0.25,0.669,1.934,-0.25,-2.443,6.13,-0.25,-5.828],
// 3 16 6.13 -0.25 -5.828 10 -0.25 -12 6.313 -0.25 3.898
  [3,16,6.13,-0.25,-5.828,10,-0.25,-12,6.313,-0.25,3.898],
// 3 16 0.422 -0.25 -3.432 -2.341 -0.25 -5.828 6.13 -0.25 -5.828
  [3,16,0.422,-0.25,-3.432,-2.341,-0.25,-5.828,6.13,-0.25,-5.828],
// 3 16 -10 -0.25 -12 10 -0.25 -12 6.13 -0.25 -9
  [3,16,-10,-0.25,-12,10,-0.25,-12,6.13,-0.25,-9],
// 3 16 -0.258 -0.25 6.516 2.516 -0.25 3.847 1.773 -0.25 5.8
  [3,16,-0.258,-0.25,6.516,2.516,-0.25,3.847,1.773,-0.25,5.8],
// 3 16 -0.006 -0.25 9.641 2.583 -0.25 9.249 10 -0.25 12
  [3,16,-0.006,-0.25,9.641,2.583,-0.25,9.249,10,-0.25,12],
// 3 16 5.882 -0.25 6.244 6.313 -0.25 3.898 10 -0.25 12
  [3,16,5.882,-0.25,6.244,6.313,-0.25,3.898,10,-0.25,12],
// 3 16 4.593 -0.25 8.072 10 -0.25 12 2.583 -0.25 9.249
  [3,16,4.593,-0.25,8.072,10,-0.25,12,2.583,-0.25,9.249],
// 3 16 10 -0.25 12 4.593 -0.25 8.072 5.882 -0.25 6.244
  [3,16,10,-0.25,12,4.593,-0.25,8.072,5.882,-0.25,6.244],
// 3 16 6.313 -0.25 3.898 10 -0.25 -12 10 -0.25 12
  [3,16,6.313,-0.25,3.898,10,-0.25,-12,10,-0.25,12],
// 3 16 -0.006 -0.25 9.641 10 -0.25 12 -10 -0.25 12
  [3,16,-0.006,-0.25,9.641,10,-0.25,12,-10,-0.25,12],
];
module ldraw_lib__191888d(step=0, col=false, unit=2/5, alt=false, line=0.2, solid=!$preview)
    makepoly(ldraw_lib__191888d(solid), step=step, col=col, unit=unit, alt=alt, line=line, solid=solid);
ldraw_lib__191888d(line=0.2);
// main file
use <../lib.scad>
use <191888d.scad>
use <3005.scad>
function ldraw_lib__3005d05() = [
// 0 Brick  1 x  1 with White "2" Sticker
// 0 Name: 3005d05.dat
// 0 Author: Takeshi Takahashi [RainbowDolphin]
// 0 !LDRAW_ORG Shortcut UPDATE 2024-06
// 0 !LICENSE Licensed under CC BY 4.0 : see CAreadme.txt
// 
// 0 BFC CERTIFY CCW
  [0,"BFC","CERTIFY"],
  [0,"BFC","CCW"],
// 
// 0 !CATEGORY Sticker Shortcut
// 0 !KEYWORDS Bricklink 3005pb010, set 7710, Train
// 
// 0 !HISTORY 2024-07-29 [OrionP] Official Update 2024-06
// 
// 1 16 0 0 0 1 0 0 0 1 0 0 0 1 3005.dat
  [1,16,0,0,0,1,0,0,0,1,0,0,0,1, ldraw_lib__3005()],
// 1 16 0 12 -10 1 0 0 0 0 -1 0 1 0 191888d.dat
  [1,16,0,12,-10,1,0,0,0,0,-1,0,1,0, ldraw_lib__191888d()],
];
module ldraw_lib__3005d05(step=0, col=false, unit=2/5, alt=false, line=0.2, solid=!$preview)
    makepoly(ldraw_lib__3005d05(), step=step, col=col, unit=unit, alt=alt, line=line, solid=solid);
ldraw_lib__3005d05(line=0.2);
